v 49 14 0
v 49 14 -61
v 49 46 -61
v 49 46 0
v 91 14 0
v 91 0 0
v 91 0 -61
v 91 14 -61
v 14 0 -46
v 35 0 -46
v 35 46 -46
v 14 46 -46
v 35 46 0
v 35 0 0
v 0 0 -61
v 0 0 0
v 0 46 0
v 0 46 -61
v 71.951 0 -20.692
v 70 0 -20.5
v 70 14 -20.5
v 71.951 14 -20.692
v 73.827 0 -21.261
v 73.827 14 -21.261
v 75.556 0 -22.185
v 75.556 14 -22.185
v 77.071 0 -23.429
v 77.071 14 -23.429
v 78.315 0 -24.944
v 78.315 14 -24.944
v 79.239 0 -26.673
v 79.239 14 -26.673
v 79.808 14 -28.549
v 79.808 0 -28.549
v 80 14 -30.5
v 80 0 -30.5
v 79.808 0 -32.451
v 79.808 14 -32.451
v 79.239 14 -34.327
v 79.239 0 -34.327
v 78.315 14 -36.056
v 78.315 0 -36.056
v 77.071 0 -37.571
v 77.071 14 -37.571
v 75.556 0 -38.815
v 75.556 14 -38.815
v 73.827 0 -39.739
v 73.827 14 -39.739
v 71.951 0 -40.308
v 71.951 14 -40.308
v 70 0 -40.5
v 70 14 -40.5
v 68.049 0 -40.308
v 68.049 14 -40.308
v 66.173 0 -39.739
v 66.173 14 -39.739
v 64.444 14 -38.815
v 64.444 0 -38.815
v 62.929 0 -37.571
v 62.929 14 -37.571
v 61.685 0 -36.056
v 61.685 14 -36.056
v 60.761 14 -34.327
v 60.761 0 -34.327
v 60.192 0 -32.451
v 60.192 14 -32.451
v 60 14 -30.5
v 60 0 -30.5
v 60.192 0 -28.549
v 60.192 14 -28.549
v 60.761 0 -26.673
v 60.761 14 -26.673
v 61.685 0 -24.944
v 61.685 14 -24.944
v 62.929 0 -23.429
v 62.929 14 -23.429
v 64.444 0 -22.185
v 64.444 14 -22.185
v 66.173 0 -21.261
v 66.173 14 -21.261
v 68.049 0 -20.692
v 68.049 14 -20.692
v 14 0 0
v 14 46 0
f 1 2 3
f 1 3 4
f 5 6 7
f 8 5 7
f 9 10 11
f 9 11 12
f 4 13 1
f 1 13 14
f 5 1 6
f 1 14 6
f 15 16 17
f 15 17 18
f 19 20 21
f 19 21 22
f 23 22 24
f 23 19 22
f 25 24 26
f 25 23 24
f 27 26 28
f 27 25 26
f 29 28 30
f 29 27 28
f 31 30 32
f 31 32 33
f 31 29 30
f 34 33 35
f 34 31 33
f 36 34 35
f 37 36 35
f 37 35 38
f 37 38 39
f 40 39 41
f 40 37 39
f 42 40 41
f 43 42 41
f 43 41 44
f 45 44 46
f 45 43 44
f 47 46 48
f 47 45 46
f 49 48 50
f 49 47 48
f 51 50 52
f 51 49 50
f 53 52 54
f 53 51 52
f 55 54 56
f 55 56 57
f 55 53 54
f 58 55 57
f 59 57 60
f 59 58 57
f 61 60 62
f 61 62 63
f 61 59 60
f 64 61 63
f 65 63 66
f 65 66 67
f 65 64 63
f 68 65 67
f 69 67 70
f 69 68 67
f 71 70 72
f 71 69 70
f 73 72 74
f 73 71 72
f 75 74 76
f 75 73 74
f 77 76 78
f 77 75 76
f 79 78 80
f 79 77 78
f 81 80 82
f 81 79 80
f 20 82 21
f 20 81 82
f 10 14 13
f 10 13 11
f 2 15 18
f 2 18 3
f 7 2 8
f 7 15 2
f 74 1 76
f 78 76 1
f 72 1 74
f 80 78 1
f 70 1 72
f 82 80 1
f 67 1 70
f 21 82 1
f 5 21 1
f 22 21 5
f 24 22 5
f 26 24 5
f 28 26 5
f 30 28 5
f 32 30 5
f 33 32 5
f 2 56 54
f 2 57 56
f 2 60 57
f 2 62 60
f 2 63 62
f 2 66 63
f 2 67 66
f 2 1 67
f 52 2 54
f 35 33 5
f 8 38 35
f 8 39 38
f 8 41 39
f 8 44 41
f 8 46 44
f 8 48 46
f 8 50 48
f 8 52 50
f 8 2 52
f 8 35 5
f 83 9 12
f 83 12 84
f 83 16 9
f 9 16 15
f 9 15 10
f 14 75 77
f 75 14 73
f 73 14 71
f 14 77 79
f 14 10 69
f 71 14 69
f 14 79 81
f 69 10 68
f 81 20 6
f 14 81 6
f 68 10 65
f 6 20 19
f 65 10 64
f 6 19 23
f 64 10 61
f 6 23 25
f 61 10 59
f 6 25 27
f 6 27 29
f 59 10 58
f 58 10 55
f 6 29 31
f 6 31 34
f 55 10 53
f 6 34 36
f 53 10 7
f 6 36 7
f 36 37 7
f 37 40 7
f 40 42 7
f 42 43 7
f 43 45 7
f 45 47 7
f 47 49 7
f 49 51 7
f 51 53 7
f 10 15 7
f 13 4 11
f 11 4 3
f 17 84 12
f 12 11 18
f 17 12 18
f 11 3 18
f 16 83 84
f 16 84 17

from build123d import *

# Parameters (mm, degrees)
EXTRUDE_1_DEPTH = 46
SKETCH_2_W      = 42
SKETCH_2_H      = 61
SKETCH_2_R      = 10
EXTRUDE_2_DEPTH = 14


with BuildPart() as part:
    # 스케치1 → 보스-돌출1 (new body)
    with BuildSketch(Plane(origin=(0, 0, 0), x_dir=(1, 0, 0), z_dir=(0, 1, 0))):
        Polygon((0, 0), (0, 61), (49, 61), (49, 0), (35, 0), (35, 46), (14, 46), (14, 0), align=None)
    extrude(amount=EXTRUDE_1_DEPTH)

    # 스케치2 → 보스-돌출2 (add)
    with BuildSketch(Plane(origin=(0, 0, 0), x_dir=(1, 0, 0), z_dir=(0, 1, 0))):
        with Locations((70, 30.5)):
            Rectangle(SKETCH_2_W, SKETCH_2_H)
        with Locations(Location((70, 30.5, 0), (0, 0, 270))):
            Circle(SKETCH_2_R, mode=Mode.SUBTRACT)
    extrude(amount=EXTRUDE_2_DEPTH)


solid = part.part
